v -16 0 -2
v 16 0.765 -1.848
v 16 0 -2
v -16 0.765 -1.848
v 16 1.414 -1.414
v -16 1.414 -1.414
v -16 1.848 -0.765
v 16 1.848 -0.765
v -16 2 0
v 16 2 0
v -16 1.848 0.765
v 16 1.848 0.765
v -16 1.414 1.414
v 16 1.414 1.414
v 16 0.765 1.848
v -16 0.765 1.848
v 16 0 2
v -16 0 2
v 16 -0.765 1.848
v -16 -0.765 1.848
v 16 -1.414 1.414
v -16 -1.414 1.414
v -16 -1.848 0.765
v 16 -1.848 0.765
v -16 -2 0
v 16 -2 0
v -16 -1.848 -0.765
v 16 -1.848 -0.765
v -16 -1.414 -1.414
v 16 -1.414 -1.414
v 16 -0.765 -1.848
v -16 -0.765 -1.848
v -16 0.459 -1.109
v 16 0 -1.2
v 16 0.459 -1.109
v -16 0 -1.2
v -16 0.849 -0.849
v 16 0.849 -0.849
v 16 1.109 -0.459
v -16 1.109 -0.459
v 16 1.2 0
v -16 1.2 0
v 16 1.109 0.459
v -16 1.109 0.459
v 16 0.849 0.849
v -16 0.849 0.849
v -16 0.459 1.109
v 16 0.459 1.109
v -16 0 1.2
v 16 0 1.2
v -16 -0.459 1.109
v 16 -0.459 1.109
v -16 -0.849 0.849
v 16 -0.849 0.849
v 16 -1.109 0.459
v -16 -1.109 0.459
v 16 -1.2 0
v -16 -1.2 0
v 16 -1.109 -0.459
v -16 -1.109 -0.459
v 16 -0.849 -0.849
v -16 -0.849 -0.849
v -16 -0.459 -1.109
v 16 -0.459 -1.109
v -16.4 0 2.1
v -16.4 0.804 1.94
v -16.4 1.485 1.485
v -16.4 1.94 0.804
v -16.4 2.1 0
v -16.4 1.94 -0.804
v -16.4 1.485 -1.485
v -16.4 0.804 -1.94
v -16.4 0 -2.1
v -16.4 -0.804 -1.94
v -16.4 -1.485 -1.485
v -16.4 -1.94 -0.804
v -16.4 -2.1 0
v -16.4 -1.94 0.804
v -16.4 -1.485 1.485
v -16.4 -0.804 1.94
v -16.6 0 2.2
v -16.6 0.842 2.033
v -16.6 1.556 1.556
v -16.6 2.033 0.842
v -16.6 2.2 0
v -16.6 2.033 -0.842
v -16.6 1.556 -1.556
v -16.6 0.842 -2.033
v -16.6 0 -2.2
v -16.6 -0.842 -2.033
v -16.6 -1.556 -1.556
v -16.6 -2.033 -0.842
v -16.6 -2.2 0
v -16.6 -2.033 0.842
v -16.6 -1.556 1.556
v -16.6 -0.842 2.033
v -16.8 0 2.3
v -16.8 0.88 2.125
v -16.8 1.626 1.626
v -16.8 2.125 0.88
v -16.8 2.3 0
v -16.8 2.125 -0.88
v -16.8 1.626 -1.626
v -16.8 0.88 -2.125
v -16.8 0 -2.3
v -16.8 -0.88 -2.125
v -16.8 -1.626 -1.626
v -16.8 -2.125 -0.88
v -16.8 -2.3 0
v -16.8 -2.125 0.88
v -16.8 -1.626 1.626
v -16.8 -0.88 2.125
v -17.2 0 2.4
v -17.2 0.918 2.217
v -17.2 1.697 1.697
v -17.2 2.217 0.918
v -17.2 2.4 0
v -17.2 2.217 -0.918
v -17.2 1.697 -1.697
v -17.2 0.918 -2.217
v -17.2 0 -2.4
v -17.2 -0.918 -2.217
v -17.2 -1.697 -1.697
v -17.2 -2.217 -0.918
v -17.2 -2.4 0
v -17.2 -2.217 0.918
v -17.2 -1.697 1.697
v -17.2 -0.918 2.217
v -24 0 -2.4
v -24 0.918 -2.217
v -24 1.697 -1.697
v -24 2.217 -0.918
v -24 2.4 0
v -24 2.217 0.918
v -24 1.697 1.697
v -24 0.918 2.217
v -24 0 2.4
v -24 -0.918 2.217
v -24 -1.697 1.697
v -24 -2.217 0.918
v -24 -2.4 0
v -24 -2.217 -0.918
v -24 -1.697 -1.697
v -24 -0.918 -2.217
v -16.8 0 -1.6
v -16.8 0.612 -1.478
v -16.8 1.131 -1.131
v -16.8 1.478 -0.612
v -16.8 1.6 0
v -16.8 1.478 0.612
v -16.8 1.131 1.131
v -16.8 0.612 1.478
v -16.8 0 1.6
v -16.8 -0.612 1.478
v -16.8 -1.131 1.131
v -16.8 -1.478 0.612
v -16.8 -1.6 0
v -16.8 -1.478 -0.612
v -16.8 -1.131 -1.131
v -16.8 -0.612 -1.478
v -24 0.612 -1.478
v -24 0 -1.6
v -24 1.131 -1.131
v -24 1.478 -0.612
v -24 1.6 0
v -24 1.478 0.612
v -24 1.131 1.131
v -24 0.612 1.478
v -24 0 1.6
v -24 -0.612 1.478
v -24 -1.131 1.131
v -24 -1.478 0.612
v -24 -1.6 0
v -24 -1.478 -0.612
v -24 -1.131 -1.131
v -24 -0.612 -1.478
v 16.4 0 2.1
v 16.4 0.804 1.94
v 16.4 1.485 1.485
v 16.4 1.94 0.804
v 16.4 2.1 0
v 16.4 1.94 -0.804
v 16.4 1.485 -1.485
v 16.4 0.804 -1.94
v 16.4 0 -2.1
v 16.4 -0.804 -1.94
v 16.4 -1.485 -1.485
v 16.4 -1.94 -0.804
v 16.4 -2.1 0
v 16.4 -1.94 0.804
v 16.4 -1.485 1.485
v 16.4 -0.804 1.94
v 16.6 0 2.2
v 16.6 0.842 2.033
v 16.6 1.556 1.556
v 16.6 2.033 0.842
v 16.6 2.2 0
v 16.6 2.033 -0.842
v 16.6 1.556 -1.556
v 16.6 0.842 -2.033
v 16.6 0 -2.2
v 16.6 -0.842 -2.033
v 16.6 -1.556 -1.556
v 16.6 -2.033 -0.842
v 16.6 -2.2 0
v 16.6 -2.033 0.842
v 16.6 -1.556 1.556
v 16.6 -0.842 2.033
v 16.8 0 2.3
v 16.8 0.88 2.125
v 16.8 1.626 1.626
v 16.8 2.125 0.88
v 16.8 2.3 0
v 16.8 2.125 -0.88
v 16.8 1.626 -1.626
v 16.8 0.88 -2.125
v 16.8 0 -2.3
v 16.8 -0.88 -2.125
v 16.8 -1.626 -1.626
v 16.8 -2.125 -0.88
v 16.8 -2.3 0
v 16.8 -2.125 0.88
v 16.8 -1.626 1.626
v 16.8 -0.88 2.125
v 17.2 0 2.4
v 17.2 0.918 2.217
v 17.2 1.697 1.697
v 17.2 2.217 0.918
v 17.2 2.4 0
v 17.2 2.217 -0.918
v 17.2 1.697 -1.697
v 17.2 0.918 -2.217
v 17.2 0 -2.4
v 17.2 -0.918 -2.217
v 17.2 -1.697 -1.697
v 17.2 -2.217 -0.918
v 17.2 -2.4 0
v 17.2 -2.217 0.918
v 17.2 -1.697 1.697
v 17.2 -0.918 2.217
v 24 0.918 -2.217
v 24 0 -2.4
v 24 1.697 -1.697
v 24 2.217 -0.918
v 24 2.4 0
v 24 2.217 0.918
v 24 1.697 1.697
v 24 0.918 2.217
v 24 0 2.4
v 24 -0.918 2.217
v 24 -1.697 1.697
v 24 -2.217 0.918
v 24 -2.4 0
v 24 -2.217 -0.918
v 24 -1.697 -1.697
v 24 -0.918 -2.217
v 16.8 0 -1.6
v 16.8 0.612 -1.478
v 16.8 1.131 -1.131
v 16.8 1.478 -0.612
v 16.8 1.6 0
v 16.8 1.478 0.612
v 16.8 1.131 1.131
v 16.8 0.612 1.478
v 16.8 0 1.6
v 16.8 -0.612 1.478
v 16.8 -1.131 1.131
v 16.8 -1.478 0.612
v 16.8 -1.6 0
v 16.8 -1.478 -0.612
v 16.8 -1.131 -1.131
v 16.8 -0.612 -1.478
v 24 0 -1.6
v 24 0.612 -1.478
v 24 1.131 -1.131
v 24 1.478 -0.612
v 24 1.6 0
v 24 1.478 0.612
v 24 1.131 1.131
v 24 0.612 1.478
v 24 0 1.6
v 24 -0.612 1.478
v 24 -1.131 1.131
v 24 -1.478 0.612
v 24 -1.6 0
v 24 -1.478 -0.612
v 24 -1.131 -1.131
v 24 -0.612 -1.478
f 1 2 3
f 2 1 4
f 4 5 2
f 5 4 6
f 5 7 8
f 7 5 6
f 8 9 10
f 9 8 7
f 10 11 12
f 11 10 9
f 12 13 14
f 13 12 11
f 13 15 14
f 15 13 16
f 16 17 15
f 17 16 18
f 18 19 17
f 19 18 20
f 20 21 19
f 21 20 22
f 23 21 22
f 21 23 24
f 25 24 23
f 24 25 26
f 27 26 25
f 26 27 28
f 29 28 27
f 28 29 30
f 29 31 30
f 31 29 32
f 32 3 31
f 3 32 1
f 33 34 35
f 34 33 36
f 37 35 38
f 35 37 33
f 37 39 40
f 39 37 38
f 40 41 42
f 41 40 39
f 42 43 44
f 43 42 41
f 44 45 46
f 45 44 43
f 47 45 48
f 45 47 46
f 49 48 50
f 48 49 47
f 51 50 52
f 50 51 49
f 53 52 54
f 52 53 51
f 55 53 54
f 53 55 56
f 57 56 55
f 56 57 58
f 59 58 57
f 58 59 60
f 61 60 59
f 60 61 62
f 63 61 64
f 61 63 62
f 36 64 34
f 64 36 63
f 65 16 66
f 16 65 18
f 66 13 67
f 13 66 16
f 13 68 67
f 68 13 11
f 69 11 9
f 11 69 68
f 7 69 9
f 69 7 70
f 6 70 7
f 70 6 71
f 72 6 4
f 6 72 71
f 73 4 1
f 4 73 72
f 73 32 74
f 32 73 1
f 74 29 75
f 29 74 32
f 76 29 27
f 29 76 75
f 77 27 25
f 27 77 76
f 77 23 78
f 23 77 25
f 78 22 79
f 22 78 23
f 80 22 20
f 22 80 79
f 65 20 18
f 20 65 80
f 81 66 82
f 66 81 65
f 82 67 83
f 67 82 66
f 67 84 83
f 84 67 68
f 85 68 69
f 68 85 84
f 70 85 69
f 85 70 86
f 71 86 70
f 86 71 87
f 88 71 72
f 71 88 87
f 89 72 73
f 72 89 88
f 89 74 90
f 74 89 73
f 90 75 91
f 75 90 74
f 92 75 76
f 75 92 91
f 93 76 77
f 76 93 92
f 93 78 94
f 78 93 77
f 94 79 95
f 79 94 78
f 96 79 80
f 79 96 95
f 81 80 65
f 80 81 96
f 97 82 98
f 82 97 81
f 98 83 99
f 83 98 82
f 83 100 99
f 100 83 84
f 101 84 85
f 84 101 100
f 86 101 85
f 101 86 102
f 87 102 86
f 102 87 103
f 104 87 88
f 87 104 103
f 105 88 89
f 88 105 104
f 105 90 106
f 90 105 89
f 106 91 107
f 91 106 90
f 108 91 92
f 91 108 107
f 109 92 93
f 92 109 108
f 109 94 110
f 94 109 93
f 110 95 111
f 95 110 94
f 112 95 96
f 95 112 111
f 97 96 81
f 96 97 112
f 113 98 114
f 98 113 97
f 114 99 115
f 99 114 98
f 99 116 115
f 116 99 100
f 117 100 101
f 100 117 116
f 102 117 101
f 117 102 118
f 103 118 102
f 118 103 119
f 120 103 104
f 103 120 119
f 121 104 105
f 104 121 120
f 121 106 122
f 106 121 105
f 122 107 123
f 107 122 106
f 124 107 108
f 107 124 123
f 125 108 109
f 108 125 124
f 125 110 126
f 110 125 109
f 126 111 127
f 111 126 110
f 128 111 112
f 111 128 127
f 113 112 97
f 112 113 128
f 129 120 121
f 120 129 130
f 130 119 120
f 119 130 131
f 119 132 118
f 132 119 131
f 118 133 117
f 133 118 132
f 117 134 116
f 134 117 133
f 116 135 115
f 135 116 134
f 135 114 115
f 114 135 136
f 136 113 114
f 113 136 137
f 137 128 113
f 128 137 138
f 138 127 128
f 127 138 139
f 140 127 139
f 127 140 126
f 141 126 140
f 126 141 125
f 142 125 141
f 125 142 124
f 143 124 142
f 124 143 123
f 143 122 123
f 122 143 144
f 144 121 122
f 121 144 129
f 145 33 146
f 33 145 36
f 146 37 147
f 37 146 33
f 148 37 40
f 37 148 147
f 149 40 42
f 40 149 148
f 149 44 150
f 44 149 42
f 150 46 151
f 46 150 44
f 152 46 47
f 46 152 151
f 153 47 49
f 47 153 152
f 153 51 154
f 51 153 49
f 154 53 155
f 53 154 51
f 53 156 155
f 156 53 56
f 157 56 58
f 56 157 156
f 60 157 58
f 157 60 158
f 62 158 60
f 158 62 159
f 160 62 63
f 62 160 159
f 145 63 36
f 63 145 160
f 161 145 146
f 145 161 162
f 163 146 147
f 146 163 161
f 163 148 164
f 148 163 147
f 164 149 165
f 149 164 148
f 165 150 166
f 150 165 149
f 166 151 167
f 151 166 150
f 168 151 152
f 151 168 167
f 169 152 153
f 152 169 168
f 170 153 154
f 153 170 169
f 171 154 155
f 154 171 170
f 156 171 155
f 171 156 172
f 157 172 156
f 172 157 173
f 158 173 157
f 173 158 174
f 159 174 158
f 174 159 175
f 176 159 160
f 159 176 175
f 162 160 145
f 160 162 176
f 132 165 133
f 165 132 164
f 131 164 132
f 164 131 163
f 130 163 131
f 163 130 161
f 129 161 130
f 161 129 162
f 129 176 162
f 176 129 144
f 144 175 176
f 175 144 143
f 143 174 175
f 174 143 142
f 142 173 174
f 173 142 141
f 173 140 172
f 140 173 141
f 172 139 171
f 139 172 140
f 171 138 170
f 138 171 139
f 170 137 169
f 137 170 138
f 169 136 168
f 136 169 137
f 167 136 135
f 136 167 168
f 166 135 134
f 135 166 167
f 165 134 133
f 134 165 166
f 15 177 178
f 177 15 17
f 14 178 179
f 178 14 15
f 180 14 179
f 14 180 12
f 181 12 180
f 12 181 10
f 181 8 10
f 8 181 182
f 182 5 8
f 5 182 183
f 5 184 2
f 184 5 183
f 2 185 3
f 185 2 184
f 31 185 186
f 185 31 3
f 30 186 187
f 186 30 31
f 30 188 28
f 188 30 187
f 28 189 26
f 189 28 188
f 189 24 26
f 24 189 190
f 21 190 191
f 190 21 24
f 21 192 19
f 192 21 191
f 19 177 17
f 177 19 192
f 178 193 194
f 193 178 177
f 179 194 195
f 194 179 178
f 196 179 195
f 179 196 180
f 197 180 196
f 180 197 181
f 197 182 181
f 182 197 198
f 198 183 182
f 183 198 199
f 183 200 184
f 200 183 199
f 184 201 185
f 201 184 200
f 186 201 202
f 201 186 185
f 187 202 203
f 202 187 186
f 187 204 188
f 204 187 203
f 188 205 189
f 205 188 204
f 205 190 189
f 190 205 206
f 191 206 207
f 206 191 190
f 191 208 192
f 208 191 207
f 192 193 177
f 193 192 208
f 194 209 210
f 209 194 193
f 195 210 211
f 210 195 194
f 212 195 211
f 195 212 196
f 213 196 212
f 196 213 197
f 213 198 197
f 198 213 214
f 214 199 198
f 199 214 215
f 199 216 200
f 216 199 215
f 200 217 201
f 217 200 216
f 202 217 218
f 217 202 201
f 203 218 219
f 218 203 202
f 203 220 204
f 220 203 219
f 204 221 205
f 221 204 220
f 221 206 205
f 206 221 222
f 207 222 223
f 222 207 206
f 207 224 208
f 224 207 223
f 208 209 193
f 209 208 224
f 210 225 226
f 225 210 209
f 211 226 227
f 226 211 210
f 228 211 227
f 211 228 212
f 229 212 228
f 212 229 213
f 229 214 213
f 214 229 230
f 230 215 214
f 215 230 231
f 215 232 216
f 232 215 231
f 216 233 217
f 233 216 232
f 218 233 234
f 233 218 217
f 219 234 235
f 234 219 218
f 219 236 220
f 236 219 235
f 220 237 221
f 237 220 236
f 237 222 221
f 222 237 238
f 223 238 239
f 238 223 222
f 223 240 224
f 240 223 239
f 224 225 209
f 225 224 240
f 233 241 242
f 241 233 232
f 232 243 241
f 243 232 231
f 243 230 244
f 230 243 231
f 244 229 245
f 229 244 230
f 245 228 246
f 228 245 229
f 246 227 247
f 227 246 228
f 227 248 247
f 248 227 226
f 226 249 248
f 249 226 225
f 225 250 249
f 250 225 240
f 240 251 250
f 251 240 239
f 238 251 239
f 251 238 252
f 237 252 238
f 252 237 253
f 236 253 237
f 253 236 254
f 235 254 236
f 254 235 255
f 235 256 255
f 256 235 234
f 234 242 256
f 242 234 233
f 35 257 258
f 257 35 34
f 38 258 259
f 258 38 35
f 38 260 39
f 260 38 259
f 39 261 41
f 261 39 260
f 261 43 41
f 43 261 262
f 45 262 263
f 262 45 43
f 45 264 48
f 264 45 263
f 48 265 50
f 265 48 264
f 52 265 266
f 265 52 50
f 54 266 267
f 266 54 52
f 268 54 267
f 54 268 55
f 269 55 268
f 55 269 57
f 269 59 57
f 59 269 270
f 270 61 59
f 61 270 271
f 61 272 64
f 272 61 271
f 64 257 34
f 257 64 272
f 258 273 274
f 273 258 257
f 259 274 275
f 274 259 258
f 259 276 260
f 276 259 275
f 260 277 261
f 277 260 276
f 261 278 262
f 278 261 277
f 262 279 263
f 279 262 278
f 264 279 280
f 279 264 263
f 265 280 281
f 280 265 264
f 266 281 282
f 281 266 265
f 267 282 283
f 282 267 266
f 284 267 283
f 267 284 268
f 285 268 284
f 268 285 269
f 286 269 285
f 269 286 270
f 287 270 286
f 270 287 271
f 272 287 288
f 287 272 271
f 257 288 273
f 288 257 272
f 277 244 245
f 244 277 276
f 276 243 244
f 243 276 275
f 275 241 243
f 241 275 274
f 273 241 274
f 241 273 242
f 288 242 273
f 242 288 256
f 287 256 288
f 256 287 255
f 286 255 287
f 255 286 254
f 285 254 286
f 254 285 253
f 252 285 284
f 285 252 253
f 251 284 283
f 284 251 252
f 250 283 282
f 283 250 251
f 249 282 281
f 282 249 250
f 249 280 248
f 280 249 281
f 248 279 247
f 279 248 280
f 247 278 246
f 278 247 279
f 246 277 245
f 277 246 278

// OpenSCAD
use <../lib.scad>
use <71533k01.scad>
use <71533k03.scad>
$fa=1; $fs=0.2;
function ldraw_lib__21766_f2(realsolid=false) = [
// 0 Technic Pneumatic Tube  6L with End Bulges
// 0 Name: 21766-f2.dat
// 0 Author: Philippe Hurbain [Philo]
// 0 !LDRAW_ORG Part UPDATE 2020-01
// 0 !LICENSE Licensed under CC BY 2.0 and CC BY 4.0 : see CAreadme.txt
// 
// 0 BFC CERTIFY CCW
  [0,"BFC","CERTIFY"],
  [0,"BFC","CCW"],
// 
// 0 !KEYWORDS 48 mm
// 
// 0 !HISTORY 2020-06-28 [PTadmin] Official Update 2020-01
// 
// 
// 1 16 -40 0 0 0 80 0 1 0 0 0 0 1 71533k03.dat
  [1,16,-40,0,0,0,80,0,1,0,0,0,0,1, ldraw_lib__71533k03(realsolid)],
// 1 16 -40 0 0 0 -1 0 1 0 0 0 0 1 71533k01.dat
  [1,16,-40,0,0,0,-1,0,1,0,0,0,0,1, ldraw_lib__71533k01(realsolid)],
// 1 16 40 0 0 0 1 0 1 0 0 0 0 1 71533k01.dat
  [1,16,40,0,0,0,1,0,1,0,0,0,0,1, ldraw_lib__71533k01(realsolid)],
];
module ldraw_lib__21766_f2(step=0, col=false, unit=2/5, alt=false, line=0.2, solid=!$preview)
    makepoly(ldraw_lib__21766_f2(solid), step=step, col=col, unit=unit, alt=alt, line=line, solid=solid);
ldraw_lib__21766_f2(line=0.2);
